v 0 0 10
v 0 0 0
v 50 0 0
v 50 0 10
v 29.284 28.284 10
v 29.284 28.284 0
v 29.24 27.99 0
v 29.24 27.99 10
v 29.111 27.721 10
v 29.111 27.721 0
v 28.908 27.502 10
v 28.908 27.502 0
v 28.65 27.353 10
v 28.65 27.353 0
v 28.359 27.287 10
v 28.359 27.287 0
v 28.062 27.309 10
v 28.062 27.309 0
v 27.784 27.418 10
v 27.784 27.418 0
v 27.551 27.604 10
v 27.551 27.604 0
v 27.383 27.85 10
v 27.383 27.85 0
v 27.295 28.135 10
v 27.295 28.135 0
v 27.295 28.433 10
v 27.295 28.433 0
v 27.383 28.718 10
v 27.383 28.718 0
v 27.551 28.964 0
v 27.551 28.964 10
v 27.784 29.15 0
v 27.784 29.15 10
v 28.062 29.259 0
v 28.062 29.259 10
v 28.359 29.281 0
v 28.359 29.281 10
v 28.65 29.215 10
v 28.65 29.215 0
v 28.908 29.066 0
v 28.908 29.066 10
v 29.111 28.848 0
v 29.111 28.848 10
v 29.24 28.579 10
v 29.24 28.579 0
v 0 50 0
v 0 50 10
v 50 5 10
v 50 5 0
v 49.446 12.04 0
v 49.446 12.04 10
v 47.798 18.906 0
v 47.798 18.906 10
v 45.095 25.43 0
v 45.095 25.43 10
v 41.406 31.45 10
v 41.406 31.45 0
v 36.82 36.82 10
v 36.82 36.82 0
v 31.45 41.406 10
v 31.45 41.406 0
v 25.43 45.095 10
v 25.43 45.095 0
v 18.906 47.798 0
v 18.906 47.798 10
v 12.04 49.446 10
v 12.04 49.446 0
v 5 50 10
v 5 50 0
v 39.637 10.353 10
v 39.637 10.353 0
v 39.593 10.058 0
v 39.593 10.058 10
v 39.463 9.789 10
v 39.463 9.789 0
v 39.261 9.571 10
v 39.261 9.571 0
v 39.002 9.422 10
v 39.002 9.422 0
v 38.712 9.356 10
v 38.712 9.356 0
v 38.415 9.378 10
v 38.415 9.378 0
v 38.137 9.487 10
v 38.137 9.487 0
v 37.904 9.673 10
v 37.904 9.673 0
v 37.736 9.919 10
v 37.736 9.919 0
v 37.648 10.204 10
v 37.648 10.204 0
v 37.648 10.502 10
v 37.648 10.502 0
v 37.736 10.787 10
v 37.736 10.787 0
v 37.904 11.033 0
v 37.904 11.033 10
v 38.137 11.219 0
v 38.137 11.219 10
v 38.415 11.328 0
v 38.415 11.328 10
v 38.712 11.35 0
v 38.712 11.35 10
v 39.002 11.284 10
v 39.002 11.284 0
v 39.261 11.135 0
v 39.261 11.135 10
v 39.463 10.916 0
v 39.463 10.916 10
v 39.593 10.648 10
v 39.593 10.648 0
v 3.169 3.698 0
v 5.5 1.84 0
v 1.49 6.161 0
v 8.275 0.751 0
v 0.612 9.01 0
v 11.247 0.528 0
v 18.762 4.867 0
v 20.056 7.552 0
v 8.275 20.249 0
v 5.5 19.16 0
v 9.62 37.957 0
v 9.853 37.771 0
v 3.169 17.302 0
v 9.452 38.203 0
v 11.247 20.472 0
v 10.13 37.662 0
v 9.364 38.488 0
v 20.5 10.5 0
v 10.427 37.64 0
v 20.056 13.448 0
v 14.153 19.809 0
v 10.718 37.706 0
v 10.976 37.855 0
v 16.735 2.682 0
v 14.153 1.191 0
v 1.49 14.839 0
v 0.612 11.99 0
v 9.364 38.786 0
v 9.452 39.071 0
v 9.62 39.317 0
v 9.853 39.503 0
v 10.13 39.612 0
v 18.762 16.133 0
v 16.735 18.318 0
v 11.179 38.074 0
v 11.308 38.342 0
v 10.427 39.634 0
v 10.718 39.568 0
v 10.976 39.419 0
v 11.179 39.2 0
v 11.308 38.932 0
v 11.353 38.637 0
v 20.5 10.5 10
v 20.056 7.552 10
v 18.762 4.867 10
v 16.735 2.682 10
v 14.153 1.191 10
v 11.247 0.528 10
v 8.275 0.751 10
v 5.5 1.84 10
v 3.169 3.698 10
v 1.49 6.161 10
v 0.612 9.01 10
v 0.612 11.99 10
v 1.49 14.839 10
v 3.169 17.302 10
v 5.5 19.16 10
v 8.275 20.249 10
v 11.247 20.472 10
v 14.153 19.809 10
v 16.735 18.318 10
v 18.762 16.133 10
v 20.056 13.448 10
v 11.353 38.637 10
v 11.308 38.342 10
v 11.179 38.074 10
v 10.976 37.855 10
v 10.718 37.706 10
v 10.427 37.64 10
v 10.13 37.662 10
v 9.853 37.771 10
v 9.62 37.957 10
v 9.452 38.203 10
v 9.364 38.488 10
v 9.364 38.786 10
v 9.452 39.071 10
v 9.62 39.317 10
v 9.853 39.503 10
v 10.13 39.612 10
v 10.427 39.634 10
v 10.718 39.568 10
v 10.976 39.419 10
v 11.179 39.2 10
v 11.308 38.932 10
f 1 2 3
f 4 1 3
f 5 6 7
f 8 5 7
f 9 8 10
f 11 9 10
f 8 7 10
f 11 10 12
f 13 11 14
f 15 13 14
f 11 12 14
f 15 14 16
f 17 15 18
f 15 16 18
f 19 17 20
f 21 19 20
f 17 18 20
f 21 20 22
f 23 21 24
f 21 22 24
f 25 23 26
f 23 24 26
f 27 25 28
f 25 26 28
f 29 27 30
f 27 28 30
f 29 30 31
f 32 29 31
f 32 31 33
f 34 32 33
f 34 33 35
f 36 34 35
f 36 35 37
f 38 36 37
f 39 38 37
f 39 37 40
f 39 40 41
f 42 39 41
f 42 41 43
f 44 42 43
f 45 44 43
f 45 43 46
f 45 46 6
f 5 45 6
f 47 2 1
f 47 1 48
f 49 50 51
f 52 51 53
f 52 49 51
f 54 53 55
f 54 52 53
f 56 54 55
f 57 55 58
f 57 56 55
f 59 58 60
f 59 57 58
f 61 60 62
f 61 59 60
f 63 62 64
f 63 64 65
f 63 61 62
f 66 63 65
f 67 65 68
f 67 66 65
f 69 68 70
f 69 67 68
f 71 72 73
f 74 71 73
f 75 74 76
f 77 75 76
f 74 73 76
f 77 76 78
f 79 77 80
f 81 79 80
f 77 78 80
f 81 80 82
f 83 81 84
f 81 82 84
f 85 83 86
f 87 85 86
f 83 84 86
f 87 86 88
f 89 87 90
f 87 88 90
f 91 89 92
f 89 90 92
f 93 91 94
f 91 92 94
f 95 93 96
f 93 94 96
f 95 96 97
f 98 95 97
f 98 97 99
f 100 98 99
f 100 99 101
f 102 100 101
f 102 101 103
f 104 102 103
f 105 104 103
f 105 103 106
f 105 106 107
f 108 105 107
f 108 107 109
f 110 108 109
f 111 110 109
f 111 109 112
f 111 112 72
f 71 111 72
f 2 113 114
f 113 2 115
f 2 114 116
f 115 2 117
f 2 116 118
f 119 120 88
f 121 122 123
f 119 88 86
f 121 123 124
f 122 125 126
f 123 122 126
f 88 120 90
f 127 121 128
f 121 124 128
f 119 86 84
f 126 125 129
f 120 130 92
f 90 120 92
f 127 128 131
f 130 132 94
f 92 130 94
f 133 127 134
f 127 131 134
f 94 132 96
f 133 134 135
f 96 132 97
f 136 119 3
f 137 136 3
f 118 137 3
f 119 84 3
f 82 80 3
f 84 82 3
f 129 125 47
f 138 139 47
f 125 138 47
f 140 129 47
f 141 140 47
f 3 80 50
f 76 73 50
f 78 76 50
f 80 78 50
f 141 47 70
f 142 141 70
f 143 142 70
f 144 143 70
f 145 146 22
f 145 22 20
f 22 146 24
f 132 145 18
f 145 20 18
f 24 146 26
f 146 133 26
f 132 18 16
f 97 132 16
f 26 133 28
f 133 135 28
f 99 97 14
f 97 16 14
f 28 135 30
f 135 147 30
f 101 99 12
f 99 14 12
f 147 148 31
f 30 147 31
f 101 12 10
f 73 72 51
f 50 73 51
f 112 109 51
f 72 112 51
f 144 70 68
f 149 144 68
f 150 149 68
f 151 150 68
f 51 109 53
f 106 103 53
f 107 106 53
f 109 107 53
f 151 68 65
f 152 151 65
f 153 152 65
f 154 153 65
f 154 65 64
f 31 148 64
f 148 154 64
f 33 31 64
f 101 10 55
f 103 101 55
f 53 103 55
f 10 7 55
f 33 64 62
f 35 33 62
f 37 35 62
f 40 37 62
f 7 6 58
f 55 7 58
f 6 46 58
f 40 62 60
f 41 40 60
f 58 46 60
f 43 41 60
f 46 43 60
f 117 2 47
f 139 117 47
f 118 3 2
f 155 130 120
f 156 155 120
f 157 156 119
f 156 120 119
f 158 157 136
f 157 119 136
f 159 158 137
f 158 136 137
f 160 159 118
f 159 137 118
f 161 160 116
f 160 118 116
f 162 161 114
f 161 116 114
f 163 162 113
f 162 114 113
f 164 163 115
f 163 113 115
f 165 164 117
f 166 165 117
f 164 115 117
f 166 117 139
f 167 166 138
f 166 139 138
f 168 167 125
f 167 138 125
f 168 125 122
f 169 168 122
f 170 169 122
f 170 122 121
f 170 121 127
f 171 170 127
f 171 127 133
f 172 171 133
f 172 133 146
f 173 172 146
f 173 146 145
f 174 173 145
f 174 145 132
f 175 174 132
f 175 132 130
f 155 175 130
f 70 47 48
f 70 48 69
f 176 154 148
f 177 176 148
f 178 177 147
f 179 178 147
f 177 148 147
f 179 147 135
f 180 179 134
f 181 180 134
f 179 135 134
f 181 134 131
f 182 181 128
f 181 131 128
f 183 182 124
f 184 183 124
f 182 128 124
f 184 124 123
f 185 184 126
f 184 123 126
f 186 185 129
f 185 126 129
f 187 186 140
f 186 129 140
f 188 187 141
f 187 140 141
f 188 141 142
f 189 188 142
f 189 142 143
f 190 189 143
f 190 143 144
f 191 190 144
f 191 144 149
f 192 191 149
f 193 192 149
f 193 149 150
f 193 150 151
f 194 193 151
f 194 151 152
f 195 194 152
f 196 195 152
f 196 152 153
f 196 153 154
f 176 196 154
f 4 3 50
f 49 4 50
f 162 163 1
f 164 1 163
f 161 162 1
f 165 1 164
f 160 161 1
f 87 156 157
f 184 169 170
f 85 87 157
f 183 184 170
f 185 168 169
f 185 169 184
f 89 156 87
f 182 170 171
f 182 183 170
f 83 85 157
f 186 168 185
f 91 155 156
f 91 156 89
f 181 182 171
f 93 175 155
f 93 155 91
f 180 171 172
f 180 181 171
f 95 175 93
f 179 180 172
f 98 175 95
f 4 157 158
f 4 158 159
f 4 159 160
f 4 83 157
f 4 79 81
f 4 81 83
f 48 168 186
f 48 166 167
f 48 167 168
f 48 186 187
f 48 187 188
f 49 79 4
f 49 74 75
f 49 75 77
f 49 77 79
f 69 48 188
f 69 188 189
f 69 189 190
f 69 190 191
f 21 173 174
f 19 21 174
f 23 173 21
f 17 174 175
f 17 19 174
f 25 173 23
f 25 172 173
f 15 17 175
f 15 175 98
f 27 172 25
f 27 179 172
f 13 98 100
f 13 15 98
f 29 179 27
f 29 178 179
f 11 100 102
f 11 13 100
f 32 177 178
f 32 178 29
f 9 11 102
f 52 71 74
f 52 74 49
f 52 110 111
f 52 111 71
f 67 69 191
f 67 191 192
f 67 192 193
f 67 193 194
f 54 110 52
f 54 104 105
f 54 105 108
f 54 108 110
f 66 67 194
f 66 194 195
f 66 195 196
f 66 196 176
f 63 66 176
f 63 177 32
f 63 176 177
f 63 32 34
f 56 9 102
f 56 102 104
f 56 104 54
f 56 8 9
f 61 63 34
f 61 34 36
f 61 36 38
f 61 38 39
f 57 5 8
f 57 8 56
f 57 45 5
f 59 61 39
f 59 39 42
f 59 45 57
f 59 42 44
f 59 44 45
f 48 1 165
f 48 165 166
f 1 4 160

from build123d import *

# Parameters (mm, degrees)
F0_W     = 50
F0_H     = 50
F1_DEPTH = 10
F3_R     = 45
F2_R     = 10
F5_DEPTH = 10.001
F4_R     = 1
F6_DEPTH = 10.001


with BuildPart() as f1:
    # F0 (on Top) → F1 (new body)
    with BuildSketch(Plane.XY):
        with Locations((25, 25)):
            Rectangle(F0_W, F0_H)
    extrude(amount=F1_DEPTH)

    # F3
    f3_edges = [f1.edges().sort_by_distance(p)[0] for p in [
        (50, 50, 5),
    ]]
    fillet(f3_edges, radius=F3_R)

    # F2 (on face) → F5 (cut, through all)
    with BuildSketch(Plane(origin=(0, 0, 0), x_dir=(1, 0, 0), z_dir=(0, 0, -1))):
        with Locations((10.5, -10.5)):
            Circle(F2_R)
    extrude(amount=-F5_DEPTH, mode=Mode.SUBTRACT)

    # F4 (on face) → F6 (cut, through all)
    with BuildSketch(Plane(origin=(0, 0, 0), x_dir=(1, 0, 0), z_dir=(0, 0, -1))):
        with Locations((10.352762, -38.637033)):
            Circle(F4_R)
        with Locations((28.284271, -28.284271)):
            Circle(F4_R)
        with Locations((38.637033, -10.352762)):
            Circle(F4_R)
    extrude(amount=-F6_DEPTH, mode=Mode.SUBTRACT)


solid = f1.part
